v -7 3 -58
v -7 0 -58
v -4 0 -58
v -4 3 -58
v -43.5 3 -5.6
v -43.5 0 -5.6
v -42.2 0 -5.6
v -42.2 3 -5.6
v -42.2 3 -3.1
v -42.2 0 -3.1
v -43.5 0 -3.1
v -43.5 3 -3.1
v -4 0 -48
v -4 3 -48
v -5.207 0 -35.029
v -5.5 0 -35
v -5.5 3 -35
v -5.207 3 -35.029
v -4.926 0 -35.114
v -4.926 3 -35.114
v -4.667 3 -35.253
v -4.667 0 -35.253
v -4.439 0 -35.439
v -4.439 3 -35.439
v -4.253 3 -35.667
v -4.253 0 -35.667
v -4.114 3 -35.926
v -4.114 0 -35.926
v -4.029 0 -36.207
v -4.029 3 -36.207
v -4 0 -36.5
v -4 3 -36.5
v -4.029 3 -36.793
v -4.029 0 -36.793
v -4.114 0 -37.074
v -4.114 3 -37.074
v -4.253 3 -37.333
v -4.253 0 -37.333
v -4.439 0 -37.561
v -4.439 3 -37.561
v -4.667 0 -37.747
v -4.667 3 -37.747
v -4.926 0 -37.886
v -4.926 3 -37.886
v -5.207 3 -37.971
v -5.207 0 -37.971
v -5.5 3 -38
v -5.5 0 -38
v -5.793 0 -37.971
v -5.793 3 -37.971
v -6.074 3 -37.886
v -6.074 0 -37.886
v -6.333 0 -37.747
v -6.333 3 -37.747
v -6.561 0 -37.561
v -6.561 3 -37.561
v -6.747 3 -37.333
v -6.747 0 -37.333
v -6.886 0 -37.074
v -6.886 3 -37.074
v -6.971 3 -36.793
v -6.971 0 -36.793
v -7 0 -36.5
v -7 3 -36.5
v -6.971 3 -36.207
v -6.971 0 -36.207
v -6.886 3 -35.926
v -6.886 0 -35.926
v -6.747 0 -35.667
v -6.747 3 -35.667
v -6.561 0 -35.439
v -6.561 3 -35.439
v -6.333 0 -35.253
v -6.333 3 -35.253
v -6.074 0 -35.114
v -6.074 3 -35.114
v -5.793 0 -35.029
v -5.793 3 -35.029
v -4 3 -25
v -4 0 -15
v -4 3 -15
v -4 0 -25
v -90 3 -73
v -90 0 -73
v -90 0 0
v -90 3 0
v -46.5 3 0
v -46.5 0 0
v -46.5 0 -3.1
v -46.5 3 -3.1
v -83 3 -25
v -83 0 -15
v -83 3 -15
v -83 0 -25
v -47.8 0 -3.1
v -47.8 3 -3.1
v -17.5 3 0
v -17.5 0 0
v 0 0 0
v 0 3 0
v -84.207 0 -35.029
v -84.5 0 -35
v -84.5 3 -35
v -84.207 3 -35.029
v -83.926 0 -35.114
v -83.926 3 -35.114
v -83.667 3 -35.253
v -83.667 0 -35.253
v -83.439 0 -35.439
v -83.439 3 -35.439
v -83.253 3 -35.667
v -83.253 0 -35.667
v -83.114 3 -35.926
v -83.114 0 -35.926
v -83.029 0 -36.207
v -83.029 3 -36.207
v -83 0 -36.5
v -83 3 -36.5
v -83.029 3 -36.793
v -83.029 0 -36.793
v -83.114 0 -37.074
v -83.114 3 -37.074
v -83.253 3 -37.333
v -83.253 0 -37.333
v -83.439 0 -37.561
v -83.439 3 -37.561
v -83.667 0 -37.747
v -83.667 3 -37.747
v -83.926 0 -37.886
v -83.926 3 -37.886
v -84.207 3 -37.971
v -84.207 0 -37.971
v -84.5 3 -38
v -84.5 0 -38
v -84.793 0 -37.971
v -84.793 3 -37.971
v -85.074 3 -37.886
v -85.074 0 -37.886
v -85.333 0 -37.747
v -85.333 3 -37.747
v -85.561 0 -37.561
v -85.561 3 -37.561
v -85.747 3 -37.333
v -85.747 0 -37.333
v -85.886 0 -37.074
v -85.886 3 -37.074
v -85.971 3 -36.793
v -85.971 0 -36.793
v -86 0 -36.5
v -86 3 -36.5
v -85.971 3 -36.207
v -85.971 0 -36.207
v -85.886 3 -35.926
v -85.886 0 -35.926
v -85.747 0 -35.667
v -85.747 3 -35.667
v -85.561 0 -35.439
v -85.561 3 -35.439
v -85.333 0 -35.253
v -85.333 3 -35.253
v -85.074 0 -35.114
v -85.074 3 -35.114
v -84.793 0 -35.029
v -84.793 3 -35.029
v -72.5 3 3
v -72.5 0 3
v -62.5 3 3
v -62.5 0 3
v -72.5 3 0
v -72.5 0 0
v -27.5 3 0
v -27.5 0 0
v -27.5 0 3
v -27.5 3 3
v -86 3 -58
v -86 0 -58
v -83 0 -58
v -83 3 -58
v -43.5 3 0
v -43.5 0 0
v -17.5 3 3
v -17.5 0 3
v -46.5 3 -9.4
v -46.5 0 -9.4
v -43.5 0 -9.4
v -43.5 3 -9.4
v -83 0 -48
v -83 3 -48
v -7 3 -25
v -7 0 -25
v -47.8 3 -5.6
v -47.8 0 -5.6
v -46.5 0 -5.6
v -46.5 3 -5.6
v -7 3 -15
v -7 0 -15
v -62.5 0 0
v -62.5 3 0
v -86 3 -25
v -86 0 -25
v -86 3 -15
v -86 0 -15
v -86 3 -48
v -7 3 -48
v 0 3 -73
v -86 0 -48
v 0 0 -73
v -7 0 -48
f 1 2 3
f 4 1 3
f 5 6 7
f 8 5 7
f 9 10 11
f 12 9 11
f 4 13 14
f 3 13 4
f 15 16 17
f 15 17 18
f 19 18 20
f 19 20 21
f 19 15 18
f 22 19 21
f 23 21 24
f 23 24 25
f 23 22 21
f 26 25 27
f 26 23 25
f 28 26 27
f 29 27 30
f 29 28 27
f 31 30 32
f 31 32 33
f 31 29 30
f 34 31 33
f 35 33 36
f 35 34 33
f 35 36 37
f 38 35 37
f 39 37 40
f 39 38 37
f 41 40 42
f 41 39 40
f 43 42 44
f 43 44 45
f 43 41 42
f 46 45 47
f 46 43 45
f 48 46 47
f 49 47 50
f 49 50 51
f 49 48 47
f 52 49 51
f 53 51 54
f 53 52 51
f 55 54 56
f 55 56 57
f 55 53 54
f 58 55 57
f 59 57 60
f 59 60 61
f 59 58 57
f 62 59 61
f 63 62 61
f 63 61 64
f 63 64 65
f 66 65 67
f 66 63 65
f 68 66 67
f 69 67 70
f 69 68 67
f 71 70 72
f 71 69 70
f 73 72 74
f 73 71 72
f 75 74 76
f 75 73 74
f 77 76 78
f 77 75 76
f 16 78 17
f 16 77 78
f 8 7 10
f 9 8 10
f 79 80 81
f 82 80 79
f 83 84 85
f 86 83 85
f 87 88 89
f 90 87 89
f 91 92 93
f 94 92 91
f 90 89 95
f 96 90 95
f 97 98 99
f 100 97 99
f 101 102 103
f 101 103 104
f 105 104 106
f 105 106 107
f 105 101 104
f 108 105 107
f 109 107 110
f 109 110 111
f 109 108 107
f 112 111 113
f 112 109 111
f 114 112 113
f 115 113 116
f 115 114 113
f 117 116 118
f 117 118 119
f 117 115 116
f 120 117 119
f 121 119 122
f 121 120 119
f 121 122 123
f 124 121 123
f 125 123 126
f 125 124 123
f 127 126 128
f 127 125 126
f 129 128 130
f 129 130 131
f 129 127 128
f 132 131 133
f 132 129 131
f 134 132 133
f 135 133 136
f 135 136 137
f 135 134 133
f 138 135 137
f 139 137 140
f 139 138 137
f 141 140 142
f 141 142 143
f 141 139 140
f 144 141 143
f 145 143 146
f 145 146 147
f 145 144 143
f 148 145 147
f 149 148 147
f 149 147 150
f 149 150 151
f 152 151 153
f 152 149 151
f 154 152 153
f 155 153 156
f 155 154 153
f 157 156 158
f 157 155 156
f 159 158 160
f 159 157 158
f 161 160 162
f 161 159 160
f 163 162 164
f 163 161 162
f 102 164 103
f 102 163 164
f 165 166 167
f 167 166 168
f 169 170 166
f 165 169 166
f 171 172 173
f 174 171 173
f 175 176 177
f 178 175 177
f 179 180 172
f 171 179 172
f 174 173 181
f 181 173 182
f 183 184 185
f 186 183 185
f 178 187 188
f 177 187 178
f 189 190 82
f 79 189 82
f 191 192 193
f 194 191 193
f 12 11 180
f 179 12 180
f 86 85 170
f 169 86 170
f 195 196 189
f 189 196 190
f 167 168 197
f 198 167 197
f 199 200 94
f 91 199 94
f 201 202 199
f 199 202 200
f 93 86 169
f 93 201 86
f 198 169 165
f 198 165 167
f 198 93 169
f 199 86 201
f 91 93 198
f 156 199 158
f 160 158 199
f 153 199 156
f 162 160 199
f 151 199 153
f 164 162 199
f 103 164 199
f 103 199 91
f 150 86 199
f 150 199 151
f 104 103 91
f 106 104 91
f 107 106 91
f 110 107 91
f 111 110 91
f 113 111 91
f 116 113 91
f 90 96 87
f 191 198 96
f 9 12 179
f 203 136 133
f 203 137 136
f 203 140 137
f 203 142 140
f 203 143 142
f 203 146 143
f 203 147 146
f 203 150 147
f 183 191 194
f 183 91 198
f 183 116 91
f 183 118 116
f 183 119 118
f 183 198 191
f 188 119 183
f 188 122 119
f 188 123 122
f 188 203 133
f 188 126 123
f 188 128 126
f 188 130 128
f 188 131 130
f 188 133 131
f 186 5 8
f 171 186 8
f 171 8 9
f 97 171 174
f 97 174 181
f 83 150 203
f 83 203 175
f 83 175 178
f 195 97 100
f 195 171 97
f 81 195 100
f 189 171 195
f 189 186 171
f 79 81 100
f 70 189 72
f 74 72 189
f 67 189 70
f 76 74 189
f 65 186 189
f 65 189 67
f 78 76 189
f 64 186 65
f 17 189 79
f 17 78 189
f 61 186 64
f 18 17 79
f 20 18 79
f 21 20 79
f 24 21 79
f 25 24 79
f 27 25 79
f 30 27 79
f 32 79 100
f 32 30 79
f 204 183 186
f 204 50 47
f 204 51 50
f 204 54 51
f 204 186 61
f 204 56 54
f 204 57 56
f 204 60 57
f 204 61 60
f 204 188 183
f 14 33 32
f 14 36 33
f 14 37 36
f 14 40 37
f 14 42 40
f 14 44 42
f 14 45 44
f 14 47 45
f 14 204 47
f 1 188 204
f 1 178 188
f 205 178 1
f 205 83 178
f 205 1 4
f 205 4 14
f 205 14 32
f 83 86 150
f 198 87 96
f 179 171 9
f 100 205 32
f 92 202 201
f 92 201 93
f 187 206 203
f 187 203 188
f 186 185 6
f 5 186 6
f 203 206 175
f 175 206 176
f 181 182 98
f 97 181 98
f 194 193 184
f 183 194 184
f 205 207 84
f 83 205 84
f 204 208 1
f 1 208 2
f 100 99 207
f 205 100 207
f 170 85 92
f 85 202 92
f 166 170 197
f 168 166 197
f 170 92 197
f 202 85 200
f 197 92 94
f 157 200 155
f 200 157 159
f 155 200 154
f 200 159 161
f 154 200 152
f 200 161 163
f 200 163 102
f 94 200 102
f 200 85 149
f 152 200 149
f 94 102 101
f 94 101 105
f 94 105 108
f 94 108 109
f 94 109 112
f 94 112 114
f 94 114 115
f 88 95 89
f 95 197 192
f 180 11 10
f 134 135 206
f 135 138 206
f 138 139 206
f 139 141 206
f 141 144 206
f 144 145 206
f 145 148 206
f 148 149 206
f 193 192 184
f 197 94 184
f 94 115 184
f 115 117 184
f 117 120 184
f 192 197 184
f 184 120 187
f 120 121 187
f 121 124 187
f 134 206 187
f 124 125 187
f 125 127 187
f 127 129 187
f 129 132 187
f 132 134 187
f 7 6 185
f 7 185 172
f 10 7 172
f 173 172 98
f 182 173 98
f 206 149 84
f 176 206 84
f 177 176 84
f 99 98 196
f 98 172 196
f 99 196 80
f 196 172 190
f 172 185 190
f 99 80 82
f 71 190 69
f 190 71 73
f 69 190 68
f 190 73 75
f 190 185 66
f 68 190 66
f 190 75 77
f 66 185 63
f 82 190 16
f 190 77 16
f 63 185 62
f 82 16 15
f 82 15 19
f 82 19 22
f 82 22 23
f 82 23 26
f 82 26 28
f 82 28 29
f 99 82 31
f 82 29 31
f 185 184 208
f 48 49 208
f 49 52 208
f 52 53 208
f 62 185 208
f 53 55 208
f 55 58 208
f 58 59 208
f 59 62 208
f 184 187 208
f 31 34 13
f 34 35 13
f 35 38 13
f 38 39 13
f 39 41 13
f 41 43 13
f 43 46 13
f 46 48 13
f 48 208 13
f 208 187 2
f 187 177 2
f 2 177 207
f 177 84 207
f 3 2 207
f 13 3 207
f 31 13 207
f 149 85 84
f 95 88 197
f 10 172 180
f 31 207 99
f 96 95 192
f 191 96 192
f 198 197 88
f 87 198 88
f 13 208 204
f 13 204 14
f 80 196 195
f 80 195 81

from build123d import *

# Parameters (mm, degrees)
SKETCH1_W           = 3
SKETCH1_H           = 10
SKETCH1_R           = 1.5
BOSS_EXTRUDE1_DEPTH = 3


with BuildPart() as part:
    # Sketch1 → Boss-Extrude1 (new body)
    # profile 1 of 2: a face of its own
    with BuildSketch(Plane(origin=(0, 0, 0), x_dir=(1, 0, 0), z_dir=(0, 1, 0))):
        Polygon((-90, 0), (-72.5, 0), (-72.5, -3), (-62.5, -3), (-62.5, 0), (-46.5, 0), (-46.5, 3.1), (-47.8, 3.1), (-47.8, 5.6), (-46.5, 5.6), (-46.5, 9.4), (-45, 9.4), (-45, 73), (-90, 73), align=None)
        with Locations((-84.5, 20)):
            Rectangle(SKETCH1_W, SKETCH1_H, mode=Mode.SUBTRACT)
        with Locations(Location((-84.5, 36.5, 0), (0, 0, 270))):
            Circle(SKETCH1_R, mode=Mode.SUBTRACT)
        with Locations((-84.5, 53)):
            Rectangle(SKETCH1_W, SKETCH1_H, mode=Mode.SUBTRACT)
    # profile 2 of 2: a face of its own
    with BuildSketch(Plane(origin=(0, 0, 0), x_dir=(1, 0, 0), z_dir=(0, 1, 0))):
        Polygon((0, 73), (-45, 73), (-45, 9.4), (-43.5, 9.4), (-43.5, 5.6), (-42.2, 5.6), (-42.2, 3.1), (-43.5, 3.1), (-43.5, 0), (-27.5, 0), (-27.5, -3), (-17.5, -3), (-17.5, 0), (0, 0), align=None)
        with Locations((-5.5, 20)):
            Rectangle(SKETCH1_W, SKETCH1_H, mode=Mode.SUBTRACT)
        with Locations(Location((-5.5, 36.5, 0), (0, 0, 270))):
            Circle(SKETCH1_R, mode=Mode.SUBTRACT)
        with Locations((-5.5, 53)):
            Rectangle(SKETCH1_W, SKETCH1_H, mode=Mode.SUBTRACT)
    extrude(amount=BOSS_EXTRUDE1_DEPTH)


solid = part.part
